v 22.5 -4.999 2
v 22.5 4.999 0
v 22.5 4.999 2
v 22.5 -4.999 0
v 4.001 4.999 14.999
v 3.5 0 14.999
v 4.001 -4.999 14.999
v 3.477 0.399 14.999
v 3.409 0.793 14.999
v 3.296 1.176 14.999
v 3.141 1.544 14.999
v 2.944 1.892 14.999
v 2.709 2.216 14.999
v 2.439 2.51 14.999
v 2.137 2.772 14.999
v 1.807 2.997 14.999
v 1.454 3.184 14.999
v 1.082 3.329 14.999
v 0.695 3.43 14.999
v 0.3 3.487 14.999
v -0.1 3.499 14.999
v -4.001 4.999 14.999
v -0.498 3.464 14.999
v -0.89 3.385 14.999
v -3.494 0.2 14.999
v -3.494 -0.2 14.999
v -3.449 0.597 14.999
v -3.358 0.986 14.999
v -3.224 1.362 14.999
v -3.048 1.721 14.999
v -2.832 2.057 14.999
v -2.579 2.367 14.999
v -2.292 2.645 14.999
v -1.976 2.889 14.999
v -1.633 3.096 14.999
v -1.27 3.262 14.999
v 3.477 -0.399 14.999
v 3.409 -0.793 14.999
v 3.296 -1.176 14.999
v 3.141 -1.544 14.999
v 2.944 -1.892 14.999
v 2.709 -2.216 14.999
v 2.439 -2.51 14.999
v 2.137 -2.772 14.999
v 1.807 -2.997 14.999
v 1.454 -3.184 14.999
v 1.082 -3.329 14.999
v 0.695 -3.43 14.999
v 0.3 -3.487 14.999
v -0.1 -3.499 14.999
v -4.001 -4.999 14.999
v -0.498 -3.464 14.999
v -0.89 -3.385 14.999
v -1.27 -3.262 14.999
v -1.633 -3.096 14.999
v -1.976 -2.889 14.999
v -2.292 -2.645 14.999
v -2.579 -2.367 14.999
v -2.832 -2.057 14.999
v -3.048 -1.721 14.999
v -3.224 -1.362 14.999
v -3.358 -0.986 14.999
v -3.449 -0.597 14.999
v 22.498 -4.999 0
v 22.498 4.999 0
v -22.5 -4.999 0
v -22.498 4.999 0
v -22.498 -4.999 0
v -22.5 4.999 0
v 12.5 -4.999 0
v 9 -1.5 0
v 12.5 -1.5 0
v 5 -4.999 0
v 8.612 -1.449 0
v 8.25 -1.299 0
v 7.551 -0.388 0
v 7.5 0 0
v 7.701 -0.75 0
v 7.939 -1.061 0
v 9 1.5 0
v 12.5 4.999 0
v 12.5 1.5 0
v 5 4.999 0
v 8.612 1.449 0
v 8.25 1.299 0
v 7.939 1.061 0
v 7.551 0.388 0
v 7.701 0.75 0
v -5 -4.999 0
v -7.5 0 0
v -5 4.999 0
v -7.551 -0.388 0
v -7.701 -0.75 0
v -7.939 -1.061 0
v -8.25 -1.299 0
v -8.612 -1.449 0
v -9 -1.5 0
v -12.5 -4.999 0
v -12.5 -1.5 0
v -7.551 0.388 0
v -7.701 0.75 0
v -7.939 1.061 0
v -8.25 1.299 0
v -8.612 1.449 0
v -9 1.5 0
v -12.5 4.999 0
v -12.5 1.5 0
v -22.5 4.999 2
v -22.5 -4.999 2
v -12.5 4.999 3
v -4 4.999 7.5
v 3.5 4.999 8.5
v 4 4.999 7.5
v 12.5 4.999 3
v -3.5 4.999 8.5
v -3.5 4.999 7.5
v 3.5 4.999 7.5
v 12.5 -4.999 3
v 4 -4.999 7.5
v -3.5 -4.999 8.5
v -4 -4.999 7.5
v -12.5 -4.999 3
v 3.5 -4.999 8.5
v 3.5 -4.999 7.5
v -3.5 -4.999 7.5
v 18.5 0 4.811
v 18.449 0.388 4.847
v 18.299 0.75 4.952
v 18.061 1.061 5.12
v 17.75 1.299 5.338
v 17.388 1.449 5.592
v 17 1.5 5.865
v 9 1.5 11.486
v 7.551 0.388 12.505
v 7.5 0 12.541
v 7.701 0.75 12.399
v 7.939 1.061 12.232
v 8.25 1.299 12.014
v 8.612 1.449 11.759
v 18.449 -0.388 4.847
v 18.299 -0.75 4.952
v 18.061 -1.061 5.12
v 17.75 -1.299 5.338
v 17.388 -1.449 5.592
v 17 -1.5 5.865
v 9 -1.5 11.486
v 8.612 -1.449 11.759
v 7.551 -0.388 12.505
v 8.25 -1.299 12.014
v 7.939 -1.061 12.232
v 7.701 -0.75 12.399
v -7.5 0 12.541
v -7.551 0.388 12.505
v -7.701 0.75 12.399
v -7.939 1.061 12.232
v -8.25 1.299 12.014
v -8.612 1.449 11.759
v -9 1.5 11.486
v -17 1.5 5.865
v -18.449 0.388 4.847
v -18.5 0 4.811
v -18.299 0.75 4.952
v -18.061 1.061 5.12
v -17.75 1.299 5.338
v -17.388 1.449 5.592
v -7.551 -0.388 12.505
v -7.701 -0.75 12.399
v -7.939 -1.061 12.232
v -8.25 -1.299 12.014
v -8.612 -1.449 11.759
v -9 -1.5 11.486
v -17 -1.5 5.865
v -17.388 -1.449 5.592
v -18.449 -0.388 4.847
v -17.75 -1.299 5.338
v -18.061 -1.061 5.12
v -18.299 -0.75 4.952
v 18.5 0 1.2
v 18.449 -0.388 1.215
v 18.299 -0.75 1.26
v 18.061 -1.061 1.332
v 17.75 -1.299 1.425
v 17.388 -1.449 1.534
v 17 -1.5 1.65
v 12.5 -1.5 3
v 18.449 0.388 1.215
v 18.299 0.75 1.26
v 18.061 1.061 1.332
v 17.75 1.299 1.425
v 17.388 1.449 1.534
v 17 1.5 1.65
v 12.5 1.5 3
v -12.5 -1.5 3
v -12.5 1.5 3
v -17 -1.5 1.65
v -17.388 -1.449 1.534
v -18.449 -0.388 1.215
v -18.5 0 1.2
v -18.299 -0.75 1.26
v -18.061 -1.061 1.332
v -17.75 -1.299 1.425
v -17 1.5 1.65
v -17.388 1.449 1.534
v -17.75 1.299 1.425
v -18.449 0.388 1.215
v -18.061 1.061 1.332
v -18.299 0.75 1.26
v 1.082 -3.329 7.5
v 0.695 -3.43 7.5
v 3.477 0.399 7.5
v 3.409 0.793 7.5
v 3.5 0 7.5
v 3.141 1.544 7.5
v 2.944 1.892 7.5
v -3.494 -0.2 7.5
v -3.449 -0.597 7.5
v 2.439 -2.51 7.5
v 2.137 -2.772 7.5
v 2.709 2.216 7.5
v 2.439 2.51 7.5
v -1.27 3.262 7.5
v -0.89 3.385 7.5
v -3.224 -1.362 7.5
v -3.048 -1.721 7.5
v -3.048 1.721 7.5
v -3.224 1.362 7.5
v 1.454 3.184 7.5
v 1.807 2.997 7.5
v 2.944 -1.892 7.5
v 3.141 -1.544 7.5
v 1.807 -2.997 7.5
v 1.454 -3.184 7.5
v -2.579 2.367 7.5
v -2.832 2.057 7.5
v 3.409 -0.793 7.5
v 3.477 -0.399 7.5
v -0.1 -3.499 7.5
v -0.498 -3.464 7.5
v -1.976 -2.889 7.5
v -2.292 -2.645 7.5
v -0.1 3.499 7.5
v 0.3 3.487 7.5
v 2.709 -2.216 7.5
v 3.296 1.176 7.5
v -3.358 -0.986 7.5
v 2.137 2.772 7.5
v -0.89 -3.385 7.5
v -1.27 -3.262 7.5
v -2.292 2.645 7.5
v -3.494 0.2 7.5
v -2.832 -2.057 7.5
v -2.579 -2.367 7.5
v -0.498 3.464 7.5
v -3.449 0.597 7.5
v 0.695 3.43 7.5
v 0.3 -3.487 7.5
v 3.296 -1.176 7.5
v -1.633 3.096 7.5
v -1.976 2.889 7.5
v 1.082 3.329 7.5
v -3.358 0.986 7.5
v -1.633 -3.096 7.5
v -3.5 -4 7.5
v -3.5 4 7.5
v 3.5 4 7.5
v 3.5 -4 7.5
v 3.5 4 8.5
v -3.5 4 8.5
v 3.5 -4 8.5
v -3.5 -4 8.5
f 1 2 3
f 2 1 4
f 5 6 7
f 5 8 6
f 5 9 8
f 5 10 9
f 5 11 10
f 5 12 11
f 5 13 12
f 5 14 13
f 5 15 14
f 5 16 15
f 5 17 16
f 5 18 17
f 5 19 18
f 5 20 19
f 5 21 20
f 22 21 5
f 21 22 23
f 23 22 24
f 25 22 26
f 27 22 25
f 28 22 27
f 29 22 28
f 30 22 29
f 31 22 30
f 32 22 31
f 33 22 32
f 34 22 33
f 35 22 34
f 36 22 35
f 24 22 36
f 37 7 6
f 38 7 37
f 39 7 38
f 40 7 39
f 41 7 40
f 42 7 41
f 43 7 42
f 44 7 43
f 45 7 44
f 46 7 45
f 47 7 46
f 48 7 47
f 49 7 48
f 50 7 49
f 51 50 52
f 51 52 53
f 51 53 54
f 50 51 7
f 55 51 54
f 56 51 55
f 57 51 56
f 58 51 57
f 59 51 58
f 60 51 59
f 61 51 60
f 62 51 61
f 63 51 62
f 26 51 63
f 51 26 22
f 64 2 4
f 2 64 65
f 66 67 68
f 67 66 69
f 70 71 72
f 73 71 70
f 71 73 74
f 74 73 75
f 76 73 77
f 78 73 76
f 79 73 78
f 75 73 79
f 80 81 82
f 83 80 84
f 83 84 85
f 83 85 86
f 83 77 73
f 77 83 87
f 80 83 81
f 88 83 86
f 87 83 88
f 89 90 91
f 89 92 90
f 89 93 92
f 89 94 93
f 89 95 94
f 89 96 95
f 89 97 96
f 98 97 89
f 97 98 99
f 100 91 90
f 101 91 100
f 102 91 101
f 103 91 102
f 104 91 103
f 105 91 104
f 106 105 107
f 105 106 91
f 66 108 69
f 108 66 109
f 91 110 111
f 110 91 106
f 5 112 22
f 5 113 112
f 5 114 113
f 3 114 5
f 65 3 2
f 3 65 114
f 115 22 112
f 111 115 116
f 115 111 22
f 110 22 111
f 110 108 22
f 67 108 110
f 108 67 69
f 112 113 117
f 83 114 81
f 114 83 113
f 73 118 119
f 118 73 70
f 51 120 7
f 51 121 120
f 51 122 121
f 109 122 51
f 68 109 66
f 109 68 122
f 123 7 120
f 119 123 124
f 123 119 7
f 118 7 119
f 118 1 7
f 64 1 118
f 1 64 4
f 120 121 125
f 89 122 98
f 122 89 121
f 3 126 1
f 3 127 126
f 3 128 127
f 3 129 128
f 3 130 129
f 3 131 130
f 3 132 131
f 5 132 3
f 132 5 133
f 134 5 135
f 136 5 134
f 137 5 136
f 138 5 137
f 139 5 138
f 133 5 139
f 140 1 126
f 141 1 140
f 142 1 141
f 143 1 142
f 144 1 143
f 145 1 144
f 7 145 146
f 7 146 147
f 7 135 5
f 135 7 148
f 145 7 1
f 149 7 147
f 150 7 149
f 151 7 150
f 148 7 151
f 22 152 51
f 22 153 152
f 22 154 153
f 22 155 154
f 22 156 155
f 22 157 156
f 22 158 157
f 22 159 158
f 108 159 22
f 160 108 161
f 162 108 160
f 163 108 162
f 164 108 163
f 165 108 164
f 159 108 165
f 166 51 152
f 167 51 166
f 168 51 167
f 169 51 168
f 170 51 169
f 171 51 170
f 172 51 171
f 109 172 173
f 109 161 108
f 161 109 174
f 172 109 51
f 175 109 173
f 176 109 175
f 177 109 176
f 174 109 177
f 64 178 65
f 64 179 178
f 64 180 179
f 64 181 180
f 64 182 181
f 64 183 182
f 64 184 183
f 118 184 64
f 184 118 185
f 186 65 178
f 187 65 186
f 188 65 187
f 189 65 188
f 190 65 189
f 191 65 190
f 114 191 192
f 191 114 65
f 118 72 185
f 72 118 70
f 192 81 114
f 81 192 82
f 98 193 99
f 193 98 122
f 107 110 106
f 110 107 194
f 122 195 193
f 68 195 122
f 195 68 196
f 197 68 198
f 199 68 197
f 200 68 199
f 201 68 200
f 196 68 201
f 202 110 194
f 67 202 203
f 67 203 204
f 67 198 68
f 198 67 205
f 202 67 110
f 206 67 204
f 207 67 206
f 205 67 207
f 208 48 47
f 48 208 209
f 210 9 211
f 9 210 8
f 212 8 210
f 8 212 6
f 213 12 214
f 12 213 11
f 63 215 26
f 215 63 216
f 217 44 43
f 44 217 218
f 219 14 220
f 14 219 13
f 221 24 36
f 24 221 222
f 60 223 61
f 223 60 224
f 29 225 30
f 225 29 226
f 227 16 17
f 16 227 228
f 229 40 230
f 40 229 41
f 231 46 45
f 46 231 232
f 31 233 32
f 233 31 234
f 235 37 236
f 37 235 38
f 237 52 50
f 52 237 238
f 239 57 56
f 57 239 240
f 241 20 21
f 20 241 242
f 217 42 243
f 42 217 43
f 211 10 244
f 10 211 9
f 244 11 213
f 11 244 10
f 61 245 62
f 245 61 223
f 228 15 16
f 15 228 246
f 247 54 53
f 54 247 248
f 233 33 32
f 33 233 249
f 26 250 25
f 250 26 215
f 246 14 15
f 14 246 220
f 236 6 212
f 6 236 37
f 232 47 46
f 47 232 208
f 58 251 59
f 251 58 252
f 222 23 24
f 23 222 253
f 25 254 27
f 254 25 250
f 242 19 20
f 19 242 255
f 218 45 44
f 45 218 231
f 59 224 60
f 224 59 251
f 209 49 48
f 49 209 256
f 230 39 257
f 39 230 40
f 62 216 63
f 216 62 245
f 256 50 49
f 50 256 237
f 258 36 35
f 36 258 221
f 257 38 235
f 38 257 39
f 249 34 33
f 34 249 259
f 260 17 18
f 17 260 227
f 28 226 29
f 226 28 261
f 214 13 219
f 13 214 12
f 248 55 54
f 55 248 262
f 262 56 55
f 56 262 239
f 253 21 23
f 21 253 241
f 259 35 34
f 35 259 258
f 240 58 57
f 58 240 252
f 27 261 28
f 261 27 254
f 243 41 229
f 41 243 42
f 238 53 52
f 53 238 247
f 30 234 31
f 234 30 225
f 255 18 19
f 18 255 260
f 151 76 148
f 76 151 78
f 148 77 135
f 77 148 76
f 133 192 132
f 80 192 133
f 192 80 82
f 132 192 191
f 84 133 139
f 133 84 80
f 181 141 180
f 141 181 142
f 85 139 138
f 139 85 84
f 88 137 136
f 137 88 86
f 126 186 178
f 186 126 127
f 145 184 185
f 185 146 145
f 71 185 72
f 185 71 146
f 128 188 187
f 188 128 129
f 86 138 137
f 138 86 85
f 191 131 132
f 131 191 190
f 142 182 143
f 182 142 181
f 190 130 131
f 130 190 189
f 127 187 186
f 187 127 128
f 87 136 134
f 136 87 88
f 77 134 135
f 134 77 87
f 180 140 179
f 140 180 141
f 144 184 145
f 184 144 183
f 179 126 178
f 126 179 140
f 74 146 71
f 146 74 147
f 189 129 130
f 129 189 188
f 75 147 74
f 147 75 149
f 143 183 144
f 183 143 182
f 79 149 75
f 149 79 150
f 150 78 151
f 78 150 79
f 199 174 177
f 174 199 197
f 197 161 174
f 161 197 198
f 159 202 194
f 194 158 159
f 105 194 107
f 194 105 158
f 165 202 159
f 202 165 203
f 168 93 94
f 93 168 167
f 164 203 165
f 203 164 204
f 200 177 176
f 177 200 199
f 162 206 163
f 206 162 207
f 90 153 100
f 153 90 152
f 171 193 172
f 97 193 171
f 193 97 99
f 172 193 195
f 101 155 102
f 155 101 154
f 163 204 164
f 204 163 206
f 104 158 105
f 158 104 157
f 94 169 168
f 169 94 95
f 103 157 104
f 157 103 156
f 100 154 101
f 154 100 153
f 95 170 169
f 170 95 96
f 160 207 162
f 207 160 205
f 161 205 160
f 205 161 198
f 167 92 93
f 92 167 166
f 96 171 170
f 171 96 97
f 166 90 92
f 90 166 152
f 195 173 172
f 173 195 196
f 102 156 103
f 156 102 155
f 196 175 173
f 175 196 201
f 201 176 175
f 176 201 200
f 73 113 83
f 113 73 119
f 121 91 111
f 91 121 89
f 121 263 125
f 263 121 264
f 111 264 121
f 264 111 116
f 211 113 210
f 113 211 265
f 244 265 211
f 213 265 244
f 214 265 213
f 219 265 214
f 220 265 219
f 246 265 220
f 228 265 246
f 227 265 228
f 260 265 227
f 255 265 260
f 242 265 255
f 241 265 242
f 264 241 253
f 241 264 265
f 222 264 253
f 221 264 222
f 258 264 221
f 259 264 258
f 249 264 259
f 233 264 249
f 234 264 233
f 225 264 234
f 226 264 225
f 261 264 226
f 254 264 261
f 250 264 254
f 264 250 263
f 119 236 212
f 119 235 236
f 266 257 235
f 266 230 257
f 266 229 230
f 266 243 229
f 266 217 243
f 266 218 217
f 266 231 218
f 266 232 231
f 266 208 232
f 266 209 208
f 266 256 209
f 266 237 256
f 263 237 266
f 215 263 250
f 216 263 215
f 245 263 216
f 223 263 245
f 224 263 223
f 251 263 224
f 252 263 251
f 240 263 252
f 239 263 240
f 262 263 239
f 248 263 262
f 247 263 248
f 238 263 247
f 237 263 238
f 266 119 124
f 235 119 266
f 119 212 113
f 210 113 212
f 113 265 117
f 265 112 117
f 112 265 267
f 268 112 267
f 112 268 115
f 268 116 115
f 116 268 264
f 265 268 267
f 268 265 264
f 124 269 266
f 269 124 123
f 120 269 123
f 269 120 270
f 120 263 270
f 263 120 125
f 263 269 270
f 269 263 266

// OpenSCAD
use <mylib.scad>;

p = .001;
pp = 2 * p;
t0 = 1;
f = .18;
sqrt3 = sqrt(3);    // 1.732
sqrt3_2 = sqrt3/2;  // .866

module dia1(x, y, z, x1, z1) {
  rotate(90, [1, 0, 0])
  linear_extrude(height = y, center = true) 
  polygon([[x1/2, z], [x/2, z1], [x/2, z]]);
}
module dia2(x, y, z, x2, z2) {
  rotate(90, [1, 0, 0])
  linear_extrude(height = y, center = true) 
  polygon([[x2, 0], [x/2, 0], [x2, z2]]);
}
module slot(z, d, len, x1=11) {
  $fs = .1;
  linear_extrude(height = z) 
  trr([x1, 0, 0]) 
  hull() 
  {
    trr([-len/2, 0, 0]) circle(r = d/2);
    trr([len/2, 0, 0]) circle(r = d/2);
  }
}
// cut center bottom
// xb width at bottom
// xt width at top
// y depth of part
// z height of cut
module centercut(xb, xt, y, z) {
  rotate(90, [1, 0, 0])
  linear_extrude(height = y, center = true) 
  // start at bottom left:
  polygon([[-xb/2, 0], [-xt/2, z], [xt/2, z], [xb/2, 0]]);

}
// small slots above center cut
// a bit of overhang here:
module clipcut(xb, xt, y, z) {
  y0 = 1;
  z0 = 1;
  xl = xt-1;
  dy = y<0 ? (y+y0) : (y-y0);
  trr([0, dy/2, z+z0/2]) cube([xl, y0, z0],true);
}

x = 45; // total width
y = 10; // total depth
z = 15; // total height
module block() {
  z1 = 2; // height of short edge 
  x1 = 8; // width of top flat
  d0 = 7; // center hole diameter
  d1 = 3; // dia of slot
  sl = 11; // slot length (end to end)
  sx = 13; // slot x offset
  // ang = asin((z-z1)/((x-x1)/2));
  difference() 
  {
    trr([0,0,z/2]) cube([x-p, y-p, z-p], true);
    dia1(x, y, z, x1, z1);
    dia1(-x, y, z, -x1, z1);
    dia2(x, y, z, x/2-10, 3);
    dia2(-x, y, z, -(x/2-10), 3);
    trr([0, 0, z/2]) cylinder(h = z, r = d0/2, center = true);
    slot(z, d1, sl-d1, sx);
    slot(z, d1, sl-d1, -sx);
    centercut(10, 8,  y, z-7.5);
    clipcut(  10, 8,  y, z-7.5);
    clipcut(  10, 8, -y, z-7.5);
  }
}

// loc=0: upright as pyramid 
// l0c=1: lying flat
loc = 0;
atrans(loc, [[0,0,0], [0,0,y/2, [-90, 0, 0]]])
block();

// cube([45,10, 15], true);
